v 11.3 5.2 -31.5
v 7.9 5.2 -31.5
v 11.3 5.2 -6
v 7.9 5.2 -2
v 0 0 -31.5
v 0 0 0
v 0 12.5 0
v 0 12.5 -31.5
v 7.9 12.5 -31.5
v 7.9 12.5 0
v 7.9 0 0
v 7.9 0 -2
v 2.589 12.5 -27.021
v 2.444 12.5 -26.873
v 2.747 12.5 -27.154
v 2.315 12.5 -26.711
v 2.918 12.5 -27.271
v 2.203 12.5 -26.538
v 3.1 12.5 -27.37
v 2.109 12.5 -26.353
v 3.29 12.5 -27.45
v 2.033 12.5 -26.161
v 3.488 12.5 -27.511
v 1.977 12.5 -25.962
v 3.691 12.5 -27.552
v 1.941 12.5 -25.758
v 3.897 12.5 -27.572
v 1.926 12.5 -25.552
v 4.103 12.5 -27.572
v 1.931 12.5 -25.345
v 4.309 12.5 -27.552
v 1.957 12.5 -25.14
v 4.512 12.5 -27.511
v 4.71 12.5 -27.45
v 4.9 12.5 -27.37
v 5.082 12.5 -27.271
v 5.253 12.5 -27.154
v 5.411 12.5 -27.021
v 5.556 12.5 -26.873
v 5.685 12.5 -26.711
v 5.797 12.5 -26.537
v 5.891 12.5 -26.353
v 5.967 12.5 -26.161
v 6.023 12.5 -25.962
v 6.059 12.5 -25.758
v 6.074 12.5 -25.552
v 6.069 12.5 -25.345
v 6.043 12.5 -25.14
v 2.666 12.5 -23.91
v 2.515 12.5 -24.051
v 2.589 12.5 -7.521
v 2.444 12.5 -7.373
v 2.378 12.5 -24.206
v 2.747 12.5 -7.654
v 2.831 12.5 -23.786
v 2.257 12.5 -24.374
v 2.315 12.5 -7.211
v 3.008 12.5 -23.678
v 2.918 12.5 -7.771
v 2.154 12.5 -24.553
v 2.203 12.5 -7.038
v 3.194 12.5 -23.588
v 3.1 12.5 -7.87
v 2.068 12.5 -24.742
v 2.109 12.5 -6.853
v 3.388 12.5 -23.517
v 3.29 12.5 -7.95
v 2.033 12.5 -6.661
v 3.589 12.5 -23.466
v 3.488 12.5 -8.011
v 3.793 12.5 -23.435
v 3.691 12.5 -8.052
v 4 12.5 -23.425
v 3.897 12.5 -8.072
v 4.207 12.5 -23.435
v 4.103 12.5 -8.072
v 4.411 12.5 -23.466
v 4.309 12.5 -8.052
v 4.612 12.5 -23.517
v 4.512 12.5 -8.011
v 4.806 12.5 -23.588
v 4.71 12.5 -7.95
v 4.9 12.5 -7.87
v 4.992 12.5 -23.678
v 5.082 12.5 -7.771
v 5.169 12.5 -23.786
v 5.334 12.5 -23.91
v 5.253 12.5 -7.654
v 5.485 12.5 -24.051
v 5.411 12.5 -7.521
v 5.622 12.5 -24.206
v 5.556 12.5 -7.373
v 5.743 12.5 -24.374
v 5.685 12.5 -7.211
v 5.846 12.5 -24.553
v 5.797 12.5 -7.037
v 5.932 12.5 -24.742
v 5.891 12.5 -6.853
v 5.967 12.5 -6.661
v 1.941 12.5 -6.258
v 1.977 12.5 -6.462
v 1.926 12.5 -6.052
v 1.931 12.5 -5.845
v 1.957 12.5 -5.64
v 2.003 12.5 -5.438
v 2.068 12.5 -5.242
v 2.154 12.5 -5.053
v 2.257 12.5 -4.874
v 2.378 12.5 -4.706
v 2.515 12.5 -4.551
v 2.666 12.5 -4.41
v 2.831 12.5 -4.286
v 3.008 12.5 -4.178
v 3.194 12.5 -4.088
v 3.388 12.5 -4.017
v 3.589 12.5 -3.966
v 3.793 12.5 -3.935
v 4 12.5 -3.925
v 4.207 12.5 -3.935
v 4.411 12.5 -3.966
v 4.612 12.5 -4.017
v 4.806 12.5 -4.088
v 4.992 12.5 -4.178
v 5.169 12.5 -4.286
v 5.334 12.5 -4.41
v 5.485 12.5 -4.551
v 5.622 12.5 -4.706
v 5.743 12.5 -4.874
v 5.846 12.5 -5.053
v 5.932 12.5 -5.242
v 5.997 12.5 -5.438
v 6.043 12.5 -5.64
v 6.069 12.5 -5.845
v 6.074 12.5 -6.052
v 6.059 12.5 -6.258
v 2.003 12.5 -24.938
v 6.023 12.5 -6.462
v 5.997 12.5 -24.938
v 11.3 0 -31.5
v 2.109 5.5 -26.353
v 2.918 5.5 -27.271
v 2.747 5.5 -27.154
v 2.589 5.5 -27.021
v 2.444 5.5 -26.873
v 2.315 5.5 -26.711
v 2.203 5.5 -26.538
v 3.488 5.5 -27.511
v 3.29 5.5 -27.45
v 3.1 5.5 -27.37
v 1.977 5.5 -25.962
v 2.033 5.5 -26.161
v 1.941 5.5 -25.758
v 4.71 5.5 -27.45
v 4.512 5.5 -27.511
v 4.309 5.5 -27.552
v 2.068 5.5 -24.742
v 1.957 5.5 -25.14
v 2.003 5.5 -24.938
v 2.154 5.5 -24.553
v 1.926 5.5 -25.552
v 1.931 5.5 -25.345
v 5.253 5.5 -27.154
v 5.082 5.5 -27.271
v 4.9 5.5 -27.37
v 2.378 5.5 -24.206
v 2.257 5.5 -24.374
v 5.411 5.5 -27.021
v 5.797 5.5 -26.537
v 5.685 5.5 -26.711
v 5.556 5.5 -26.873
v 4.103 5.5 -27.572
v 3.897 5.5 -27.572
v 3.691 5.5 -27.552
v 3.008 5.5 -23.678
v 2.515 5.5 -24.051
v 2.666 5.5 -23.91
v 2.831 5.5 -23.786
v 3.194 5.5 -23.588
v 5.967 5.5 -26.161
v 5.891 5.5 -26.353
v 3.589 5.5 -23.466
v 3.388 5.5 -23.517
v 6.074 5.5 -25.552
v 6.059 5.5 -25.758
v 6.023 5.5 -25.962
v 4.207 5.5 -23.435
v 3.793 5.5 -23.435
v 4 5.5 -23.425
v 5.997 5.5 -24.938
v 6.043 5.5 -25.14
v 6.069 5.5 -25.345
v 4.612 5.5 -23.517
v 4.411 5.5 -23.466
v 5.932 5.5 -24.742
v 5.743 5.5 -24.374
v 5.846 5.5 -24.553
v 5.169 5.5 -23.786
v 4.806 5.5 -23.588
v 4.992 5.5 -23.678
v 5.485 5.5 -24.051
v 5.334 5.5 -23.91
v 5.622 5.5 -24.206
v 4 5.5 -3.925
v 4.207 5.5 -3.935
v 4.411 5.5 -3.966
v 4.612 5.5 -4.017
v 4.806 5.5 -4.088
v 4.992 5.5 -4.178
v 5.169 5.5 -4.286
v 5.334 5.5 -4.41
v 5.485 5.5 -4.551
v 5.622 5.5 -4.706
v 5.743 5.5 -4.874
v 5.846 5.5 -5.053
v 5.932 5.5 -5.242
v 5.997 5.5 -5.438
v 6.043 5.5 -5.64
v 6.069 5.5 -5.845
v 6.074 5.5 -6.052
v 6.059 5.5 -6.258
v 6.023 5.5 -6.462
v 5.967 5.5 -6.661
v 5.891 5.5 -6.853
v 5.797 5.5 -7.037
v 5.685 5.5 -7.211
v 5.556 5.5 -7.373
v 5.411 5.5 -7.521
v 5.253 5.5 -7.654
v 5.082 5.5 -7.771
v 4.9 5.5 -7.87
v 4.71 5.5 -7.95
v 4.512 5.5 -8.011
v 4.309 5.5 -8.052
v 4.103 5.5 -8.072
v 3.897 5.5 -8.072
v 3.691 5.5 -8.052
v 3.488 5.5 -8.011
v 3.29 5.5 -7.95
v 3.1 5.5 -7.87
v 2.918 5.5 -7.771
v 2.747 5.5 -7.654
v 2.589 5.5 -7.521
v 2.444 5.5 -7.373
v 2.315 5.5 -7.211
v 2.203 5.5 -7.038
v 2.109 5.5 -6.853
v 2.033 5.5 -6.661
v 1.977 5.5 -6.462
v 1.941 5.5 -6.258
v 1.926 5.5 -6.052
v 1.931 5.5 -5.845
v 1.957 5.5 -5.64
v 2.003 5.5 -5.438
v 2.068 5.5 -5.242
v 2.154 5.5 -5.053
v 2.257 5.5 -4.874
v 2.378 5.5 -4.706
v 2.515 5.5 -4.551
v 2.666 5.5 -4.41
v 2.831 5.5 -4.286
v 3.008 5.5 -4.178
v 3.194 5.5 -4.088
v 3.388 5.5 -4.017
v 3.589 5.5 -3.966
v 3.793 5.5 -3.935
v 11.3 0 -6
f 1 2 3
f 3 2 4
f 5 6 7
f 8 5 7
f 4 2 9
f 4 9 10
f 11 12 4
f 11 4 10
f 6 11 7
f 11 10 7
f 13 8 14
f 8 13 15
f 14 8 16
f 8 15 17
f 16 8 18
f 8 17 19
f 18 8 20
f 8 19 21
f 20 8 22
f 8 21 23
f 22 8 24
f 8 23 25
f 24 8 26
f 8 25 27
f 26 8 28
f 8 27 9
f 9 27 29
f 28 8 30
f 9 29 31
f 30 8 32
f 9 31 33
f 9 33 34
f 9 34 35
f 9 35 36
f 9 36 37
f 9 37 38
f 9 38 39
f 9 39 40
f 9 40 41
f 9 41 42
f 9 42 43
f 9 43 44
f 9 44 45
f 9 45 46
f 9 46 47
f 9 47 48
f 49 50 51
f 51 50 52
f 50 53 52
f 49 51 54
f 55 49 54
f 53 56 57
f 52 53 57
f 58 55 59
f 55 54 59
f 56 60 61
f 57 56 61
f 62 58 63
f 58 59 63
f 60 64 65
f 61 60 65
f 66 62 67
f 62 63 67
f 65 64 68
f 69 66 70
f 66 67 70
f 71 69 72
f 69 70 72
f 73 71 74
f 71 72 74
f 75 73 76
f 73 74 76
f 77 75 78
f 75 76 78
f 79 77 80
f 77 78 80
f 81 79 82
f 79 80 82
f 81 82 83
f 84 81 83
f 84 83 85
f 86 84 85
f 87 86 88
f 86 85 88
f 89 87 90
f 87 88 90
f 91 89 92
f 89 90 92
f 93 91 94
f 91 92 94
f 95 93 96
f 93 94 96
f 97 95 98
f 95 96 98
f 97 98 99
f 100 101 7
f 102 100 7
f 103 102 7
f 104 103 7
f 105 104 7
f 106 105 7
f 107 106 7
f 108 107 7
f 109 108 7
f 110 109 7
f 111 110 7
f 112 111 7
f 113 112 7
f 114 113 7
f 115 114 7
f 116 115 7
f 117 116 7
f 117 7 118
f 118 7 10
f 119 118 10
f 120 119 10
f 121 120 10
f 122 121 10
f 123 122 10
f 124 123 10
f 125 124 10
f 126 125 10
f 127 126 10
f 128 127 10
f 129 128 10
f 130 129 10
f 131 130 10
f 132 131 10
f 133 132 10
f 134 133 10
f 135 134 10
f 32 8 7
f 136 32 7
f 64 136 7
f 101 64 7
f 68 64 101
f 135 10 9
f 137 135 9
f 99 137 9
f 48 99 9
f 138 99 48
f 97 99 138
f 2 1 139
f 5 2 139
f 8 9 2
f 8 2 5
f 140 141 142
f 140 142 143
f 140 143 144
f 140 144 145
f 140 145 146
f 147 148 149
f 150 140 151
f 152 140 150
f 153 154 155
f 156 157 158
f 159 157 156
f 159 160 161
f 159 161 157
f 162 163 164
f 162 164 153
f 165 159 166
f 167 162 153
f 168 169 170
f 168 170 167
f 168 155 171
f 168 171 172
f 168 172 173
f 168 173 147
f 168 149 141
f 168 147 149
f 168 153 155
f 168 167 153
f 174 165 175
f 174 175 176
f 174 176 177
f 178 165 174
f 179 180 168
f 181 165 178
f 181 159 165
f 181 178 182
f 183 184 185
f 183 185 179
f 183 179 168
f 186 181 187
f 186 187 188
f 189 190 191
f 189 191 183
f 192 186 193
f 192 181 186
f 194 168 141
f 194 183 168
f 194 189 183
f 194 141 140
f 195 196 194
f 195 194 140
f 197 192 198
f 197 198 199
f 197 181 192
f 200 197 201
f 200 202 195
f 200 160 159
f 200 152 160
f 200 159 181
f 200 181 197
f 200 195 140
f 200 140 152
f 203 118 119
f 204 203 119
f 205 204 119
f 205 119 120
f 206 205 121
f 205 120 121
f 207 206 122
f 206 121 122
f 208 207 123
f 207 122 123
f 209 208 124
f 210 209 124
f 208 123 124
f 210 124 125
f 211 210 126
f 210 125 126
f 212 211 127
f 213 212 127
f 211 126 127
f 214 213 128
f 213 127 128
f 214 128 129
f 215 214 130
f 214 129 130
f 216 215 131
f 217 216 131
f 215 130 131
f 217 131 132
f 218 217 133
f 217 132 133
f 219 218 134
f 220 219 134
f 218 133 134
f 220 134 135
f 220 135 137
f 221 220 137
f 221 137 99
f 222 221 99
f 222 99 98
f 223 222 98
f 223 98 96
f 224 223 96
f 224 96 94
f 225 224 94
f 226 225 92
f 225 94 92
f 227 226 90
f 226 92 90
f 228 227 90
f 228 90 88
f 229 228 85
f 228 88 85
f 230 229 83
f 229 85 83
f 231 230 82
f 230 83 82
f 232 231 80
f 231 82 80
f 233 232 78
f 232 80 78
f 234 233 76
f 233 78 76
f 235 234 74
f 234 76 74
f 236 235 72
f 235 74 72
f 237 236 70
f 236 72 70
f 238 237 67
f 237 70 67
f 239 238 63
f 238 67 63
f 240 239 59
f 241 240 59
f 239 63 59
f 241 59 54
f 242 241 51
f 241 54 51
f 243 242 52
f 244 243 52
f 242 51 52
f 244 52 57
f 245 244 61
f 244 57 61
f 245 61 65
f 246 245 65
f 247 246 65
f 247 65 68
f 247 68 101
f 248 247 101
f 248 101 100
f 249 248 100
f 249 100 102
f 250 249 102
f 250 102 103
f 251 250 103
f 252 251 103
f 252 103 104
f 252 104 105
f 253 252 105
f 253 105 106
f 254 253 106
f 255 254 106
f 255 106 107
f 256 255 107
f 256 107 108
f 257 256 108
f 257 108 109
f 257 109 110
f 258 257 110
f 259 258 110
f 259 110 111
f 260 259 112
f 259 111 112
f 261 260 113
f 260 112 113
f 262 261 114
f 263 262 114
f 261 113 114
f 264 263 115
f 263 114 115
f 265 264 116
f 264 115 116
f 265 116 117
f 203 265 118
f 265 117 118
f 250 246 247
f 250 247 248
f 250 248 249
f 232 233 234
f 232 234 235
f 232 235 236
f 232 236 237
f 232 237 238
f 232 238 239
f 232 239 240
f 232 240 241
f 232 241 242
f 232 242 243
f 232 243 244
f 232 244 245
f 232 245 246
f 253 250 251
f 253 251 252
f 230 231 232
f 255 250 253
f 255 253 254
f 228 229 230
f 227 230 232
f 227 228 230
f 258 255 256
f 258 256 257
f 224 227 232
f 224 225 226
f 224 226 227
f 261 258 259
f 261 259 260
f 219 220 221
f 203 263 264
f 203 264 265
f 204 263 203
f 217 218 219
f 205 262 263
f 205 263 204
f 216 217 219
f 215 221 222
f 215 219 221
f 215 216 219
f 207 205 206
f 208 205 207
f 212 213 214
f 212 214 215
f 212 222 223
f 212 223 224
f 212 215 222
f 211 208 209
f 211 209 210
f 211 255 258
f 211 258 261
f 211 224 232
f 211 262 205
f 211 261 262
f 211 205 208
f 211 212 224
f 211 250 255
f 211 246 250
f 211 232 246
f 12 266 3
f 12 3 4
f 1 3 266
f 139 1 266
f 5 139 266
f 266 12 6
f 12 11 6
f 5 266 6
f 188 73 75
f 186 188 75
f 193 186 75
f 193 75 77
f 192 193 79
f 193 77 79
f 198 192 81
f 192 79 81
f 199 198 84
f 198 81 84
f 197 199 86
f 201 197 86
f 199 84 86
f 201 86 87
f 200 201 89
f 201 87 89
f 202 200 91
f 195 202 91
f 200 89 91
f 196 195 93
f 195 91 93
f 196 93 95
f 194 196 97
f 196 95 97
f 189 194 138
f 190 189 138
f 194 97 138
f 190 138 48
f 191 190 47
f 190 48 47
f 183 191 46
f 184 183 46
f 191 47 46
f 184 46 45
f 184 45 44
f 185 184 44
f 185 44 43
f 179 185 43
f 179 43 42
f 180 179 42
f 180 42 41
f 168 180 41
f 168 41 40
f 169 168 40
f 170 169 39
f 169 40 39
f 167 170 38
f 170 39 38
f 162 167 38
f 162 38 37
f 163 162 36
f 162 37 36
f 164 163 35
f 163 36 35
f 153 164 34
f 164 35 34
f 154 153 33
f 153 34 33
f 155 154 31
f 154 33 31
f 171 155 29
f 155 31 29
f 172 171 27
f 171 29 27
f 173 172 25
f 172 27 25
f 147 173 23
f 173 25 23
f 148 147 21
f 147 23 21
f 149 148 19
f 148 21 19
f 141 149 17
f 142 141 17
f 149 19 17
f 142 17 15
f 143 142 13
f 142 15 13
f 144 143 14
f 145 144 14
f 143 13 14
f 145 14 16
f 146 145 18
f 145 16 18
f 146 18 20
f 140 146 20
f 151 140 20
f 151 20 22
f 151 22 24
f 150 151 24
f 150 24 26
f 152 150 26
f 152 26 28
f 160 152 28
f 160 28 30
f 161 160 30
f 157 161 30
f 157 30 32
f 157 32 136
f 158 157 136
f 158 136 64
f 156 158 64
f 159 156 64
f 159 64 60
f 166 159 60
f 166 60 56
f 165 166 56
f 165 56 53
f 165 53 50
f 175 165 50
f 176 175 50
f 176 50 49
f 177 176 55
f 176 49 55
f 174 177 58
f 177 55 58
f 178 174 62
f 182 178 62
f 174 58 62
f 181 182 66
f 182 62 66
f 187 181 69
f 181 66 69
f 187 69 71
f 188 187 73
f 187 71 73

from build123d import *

# Parameters (mm, degrees)
BOSS_EXTRUDE1_DEPTH = 31.5
SKETCH2_R           = 2.075
CUT_EXTRUDE1_DEPTH  = 7
CUT_EXTRUDE2_DEPTH  = 10


with BuildPart() as part:
    # Sketch1 → Boss-Extrude1 (new body)
    with BuildSketch(Plane.XY):
        Polygon((0, 0), (0, 12.5), (7.9, 12.5), (7.9, 5.2), (11.3, 5.2), (11.3, 0), align=None)
    extrude(amount=-BOSS_EXTRUDE1_DEPTH)

    # Sketch2 → Cut-Extrude1 (cut)
    with BuildSketch(Plane(origin=(0, 12.5, 0), x_dir=(1, 0, 0), z_dir=(0, 1, 0))):
        with Locations(Location((4, 6, 0), (0, 0, 270))):
            Circle(SKETCH2_R)
        with Locations(Location((4, 25.5, 0), (0, 0, 270))):
            Circle(SKETCH2_R)
    extrude(amount=-CUT_EXTRUDE1_DEPTH, mode=Mode.SUBTRACT)

    # Sketch3 → Cut-Extrude2 (cut)
    with BuildSketch(Plane.XZ):
        Polygon((7.9, -2), (7.9, 0), (11.3, 0), (11.3, -6), align=None)
    extrude(amount=-CUT_EXTRUDE2_DEPTH, mode=Mode.SUBTRACT)


solid = part.part
